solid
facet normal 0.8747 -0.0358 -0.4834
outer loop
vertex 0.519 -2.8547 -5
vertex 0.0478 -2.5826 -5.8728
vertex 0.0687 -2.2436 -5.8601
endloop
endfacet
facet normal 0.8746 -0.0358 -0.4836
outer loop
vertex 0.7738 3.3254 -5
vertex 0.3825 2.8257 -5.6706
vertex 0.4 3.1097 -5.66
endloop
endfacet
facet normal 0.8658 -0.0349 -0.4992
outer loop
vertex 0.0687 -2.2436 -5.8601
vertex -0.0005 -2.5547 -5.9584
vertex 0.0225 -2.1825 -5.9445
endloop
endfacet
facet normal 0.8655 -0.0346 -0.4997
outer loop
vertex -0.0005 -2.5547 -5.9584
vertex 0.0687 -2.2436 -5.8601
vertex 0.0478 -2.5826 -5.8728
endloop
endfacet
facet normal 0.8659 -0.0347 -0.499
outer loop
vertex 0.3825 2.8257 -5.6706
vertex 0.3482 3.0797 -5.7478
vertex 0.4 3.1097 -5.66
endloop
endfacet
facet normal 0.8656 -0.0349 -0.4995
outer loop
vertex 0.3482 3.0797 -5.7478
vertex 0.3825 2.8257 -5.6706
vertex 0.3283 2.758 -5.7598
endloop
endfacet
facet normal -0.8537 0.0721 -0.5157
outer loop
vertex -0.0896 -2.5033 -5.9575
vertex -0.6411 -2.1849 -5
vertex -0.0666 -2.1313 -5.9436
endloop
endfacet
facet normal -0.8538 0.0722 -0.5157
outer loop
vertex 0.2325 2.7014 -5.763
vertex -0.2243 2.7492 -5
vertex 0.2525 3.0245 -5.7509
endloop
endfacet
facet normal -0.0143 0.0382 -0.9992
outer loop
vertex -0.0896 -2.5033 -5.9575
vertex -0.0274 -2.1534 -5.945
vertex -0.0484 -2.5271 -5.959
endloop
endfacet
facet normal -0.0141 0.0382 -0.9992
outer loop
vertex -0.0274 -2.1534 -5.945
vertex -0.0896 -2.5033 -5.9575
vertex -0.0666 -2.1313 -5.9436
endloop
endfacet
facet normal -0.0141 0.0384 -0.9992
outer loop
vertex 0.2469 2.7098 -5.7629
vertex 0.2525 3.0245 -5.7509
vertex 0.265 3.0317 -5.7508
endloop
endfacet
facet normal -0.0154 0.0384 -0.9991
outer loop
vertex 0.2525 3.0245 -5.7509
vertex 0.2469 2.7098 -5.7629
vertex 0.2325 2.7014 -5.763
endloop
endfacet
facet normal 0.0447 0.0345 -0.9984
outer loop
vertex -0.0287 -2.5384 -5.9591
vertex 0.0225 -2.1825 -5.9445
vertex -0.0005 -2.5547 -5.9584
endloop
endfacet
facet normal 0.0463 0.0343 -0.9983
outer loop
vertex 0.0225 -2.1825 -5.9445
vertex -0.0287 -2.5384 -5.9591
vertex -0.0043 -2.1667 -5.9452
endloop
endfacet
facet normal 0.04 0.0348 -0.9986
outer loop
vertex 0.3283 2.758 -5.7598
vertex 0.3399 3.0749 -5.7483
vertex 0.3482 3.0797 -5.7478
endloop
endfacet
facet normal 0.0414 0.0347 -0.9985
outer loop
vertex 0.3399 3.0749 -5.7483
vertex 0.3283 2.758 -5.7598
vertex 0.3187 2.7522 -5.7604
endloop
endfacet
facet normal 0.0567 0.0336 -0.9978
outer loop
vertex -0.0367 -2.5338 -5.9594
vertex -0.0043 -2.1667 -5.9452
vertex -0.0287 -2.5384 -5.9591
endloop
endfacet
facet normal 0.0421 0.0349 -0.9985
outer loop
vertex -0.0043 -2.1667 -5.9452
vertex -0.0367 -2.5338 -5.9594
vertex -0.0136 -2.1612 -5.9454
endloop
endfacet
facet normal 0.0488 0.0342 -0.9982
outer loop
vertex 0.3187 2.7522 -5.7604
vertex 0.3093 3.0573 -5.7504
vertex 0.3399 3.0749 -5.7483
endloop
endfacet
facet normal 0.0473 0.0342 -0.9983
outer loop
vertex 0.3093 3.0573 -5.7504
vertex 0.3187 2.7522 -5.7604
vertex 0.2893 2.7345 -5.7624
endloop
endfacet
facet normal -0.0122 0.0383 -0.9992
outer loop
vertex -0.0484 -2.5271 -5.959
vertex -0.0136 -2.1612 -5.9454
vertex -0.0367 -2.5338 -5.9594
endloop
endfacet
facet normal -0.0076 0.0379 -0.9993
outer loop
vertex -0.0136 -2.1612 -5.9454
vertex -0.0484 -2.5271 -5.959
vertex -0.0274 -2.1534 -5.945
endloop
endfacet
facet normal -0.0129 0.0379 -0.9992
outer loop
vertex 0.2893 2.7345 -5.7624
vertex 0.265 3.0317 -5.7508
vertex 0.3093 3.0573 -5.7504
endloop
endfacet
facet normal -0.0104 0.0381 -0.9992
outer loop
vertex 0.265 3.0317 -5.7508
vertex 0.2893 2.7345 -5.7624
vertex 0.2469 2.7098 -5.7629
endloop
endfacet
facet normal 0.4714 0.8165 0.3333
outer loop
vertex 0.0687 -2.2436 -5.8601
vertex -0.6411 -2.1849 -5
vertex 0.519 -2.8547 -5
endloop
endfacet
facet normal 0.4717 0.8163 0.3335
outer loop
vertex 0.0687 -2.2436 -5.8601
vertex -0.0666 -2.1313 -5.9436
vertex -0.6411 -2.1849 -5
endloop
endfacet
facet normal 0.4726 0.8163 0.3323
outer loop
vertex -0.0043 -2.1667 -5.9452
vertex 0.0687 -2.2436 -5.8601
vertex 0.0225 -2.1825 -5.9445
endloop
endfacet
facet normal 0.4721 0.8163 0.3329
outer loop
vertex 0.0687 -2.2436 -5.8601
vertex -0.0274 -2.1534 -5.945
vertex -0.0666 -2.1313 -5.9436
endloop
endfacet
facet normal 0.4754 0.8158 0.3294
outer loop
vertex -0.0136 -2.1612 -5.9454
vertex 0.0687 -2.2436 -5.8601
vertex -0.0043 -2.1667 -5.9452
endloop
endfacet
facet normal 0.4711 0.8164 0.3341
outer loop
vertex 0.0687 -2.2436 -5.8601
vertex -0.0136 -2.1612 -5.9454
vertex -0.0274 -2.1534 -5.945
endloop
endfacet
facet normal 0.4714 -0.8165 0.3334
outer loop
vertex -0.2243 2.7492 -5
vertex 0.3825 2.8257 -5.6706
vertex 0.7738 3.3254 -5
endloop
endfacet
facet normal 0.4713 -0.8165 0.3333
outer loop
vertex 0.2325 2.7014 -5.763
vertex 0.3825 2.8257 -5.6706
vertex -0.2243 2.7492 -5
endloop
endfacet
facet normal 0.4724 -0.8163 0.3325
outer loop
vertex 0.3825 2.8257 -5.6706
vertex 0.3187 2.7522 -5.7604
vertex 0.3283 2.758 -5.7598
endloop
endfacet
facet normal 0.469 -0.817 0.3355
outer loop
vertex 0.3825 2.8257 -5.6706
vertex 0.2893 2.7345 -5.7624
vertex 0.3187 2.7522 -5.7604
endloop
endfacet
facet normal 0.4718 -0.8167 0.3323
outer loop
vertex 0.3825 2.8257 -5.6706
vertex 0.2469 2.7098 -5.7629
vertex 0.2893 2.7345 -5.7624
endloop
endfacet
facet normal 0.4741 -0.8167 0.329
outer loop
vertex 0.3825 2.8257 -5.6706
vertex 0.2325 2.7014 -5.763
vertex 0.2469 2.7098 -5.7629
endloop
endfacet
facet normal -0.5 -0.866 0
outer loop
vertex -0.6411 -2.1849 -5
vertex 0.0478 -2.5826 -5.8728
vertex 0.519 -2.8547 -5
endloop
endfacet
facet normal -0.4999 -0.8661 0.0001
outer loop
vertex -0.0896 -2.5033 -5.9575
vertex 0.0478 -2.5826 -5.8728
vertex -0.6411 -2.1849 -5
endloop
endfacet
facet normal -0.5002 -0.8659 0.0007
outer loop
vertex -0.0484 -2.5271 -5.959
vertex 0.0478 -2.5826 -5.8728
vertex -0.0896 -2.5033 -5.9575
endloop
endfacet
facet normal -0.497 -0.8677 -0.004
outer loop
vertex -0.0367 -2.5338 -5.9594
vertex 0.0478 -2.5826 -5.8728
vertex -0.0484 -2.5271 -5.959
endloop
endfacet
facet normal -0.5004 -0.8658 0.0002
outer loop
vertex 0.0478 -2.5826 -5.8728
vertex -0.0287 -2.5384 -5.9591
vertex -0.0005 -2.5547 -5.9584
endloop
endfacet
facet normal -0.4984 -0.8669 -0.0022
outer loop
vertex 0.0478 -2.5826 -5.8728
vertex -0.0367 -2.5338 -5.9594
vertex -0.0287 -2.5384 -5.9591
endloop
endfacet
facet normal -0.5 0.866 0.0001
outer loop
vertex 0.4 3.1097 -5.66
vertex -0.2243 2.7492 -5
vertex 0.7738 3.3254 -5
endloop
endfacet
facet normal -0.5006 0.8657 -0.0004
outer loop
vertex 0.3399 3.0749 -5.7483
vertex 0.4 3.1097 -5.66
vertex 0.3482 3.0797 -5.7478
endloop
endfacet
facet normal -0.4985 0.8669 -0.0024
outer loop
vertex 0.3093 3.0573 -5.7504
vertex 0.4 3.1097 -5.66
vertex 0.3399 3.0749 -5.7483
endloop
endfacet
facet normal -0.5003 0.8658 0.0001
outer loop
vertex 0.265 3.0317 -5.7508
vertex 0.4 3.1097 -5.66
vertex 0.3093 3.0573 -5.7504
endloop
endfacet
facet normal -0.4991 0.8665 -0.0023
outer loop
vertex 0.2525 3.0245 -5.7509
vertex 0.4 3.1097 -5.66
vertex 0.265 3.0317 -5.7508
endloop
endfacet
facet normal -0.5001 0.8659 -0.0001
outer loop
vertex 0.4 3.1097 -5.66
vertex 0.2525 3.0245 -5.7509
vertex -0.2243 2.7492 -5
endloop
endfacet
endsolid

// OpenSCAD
// Auto-generated OpenSCAD file

    inner_points = 10*[[0.41372241203438104, 0.5161844232125496, -0.5000000000005286], [0.41372241203630644, 0.5161844232124951, 0.4999999999994715], [-0.4523012409070252, 0.01618139067572292, -0.49999999999888844], [-0.45230124090509977, 0.01618139067566849, 0.5000000000011117], [0.4137259137098271, -0.48381557678131953, -0.500000000000583], [0.41372591371175244, -0.483815576781374, 0.49999999999941697], [0.125049028277489, 0.016183412369028788, -1.316496580927726]];

    outer_points = 10*[[-0.47409817149378863, 0.5195152510494393, 0.29777199506773233], [-0.5358247145183108, -0.47788127840371986, 0.2604893325952726], [0.04291122844378145, 0.5195152510494393, -0.5582077245379332], [-0.018815314580740705, -0.47788127840371986, -0.5954903870103929], [0.5237767575867904, 0.4570642920808602, 0.3163597231788905], [0.4620502145622683, -0.540332237372299, 0.2790770607064307], [0.08126278284427152, 1.313069120854264, 0.049082497672875716]];

    // Convex hull for inner set (I)
    module inner_hull() {
        hull() {
            for (p = inner_points) {
                translate(p) sphere(r=0.1);
            }
        }
    }

    // Convex hull for outer set (O) minus inner hull (O \ I)
    module outer_minus_inner() {
        difference() {
            hull() {
                for (p = outer_points) {
                    translate(p) sphere(r=0.1);
                }
            }
            inner_hull(); // Subtract inner hull
        }
    }

    // Convex hull for outer set (O) minus all translated inner hulls
    module outer_minus_AllTranslationInner() {
        difference() {
            hull() {
                for (p = outer_points) {
                    translate(p) sphere(r=0.1);
                }
            }
            hull() {
                translate([0,0,50]) inner_hull();
                translate([0,0,-50]) inner_hull();
            }; // Subtract translated inner hulls
        }
    }

    // Difference between outer_minus_inner and outer_minus_AllTranslationInner
    module outer_minus_inner_diff() {
        difference() {
            // Outer minus inner
            difference() {
                hull() {
                    for (p = outer_points) {
                        translate(p) sphere(r=0.1);
                    }
                }
                inner_hull();
            }

            // Subtract Outer minus AllTranslationInner
            difference() {
                hull() {
                    for (p = outer_points) {
                        translate(p) sphere(r=0.1);
                    }
                }
                hull() {
                    translate([0,0,50]) inner_hull();
                    translate([0,0,-50]) inner_hull();
                };
            }
        }
    }

    // Rendering all with colors applied
    color([1, 1, 0, 1]) outer_minus_inner_diff(); // Opaque yellow
    
